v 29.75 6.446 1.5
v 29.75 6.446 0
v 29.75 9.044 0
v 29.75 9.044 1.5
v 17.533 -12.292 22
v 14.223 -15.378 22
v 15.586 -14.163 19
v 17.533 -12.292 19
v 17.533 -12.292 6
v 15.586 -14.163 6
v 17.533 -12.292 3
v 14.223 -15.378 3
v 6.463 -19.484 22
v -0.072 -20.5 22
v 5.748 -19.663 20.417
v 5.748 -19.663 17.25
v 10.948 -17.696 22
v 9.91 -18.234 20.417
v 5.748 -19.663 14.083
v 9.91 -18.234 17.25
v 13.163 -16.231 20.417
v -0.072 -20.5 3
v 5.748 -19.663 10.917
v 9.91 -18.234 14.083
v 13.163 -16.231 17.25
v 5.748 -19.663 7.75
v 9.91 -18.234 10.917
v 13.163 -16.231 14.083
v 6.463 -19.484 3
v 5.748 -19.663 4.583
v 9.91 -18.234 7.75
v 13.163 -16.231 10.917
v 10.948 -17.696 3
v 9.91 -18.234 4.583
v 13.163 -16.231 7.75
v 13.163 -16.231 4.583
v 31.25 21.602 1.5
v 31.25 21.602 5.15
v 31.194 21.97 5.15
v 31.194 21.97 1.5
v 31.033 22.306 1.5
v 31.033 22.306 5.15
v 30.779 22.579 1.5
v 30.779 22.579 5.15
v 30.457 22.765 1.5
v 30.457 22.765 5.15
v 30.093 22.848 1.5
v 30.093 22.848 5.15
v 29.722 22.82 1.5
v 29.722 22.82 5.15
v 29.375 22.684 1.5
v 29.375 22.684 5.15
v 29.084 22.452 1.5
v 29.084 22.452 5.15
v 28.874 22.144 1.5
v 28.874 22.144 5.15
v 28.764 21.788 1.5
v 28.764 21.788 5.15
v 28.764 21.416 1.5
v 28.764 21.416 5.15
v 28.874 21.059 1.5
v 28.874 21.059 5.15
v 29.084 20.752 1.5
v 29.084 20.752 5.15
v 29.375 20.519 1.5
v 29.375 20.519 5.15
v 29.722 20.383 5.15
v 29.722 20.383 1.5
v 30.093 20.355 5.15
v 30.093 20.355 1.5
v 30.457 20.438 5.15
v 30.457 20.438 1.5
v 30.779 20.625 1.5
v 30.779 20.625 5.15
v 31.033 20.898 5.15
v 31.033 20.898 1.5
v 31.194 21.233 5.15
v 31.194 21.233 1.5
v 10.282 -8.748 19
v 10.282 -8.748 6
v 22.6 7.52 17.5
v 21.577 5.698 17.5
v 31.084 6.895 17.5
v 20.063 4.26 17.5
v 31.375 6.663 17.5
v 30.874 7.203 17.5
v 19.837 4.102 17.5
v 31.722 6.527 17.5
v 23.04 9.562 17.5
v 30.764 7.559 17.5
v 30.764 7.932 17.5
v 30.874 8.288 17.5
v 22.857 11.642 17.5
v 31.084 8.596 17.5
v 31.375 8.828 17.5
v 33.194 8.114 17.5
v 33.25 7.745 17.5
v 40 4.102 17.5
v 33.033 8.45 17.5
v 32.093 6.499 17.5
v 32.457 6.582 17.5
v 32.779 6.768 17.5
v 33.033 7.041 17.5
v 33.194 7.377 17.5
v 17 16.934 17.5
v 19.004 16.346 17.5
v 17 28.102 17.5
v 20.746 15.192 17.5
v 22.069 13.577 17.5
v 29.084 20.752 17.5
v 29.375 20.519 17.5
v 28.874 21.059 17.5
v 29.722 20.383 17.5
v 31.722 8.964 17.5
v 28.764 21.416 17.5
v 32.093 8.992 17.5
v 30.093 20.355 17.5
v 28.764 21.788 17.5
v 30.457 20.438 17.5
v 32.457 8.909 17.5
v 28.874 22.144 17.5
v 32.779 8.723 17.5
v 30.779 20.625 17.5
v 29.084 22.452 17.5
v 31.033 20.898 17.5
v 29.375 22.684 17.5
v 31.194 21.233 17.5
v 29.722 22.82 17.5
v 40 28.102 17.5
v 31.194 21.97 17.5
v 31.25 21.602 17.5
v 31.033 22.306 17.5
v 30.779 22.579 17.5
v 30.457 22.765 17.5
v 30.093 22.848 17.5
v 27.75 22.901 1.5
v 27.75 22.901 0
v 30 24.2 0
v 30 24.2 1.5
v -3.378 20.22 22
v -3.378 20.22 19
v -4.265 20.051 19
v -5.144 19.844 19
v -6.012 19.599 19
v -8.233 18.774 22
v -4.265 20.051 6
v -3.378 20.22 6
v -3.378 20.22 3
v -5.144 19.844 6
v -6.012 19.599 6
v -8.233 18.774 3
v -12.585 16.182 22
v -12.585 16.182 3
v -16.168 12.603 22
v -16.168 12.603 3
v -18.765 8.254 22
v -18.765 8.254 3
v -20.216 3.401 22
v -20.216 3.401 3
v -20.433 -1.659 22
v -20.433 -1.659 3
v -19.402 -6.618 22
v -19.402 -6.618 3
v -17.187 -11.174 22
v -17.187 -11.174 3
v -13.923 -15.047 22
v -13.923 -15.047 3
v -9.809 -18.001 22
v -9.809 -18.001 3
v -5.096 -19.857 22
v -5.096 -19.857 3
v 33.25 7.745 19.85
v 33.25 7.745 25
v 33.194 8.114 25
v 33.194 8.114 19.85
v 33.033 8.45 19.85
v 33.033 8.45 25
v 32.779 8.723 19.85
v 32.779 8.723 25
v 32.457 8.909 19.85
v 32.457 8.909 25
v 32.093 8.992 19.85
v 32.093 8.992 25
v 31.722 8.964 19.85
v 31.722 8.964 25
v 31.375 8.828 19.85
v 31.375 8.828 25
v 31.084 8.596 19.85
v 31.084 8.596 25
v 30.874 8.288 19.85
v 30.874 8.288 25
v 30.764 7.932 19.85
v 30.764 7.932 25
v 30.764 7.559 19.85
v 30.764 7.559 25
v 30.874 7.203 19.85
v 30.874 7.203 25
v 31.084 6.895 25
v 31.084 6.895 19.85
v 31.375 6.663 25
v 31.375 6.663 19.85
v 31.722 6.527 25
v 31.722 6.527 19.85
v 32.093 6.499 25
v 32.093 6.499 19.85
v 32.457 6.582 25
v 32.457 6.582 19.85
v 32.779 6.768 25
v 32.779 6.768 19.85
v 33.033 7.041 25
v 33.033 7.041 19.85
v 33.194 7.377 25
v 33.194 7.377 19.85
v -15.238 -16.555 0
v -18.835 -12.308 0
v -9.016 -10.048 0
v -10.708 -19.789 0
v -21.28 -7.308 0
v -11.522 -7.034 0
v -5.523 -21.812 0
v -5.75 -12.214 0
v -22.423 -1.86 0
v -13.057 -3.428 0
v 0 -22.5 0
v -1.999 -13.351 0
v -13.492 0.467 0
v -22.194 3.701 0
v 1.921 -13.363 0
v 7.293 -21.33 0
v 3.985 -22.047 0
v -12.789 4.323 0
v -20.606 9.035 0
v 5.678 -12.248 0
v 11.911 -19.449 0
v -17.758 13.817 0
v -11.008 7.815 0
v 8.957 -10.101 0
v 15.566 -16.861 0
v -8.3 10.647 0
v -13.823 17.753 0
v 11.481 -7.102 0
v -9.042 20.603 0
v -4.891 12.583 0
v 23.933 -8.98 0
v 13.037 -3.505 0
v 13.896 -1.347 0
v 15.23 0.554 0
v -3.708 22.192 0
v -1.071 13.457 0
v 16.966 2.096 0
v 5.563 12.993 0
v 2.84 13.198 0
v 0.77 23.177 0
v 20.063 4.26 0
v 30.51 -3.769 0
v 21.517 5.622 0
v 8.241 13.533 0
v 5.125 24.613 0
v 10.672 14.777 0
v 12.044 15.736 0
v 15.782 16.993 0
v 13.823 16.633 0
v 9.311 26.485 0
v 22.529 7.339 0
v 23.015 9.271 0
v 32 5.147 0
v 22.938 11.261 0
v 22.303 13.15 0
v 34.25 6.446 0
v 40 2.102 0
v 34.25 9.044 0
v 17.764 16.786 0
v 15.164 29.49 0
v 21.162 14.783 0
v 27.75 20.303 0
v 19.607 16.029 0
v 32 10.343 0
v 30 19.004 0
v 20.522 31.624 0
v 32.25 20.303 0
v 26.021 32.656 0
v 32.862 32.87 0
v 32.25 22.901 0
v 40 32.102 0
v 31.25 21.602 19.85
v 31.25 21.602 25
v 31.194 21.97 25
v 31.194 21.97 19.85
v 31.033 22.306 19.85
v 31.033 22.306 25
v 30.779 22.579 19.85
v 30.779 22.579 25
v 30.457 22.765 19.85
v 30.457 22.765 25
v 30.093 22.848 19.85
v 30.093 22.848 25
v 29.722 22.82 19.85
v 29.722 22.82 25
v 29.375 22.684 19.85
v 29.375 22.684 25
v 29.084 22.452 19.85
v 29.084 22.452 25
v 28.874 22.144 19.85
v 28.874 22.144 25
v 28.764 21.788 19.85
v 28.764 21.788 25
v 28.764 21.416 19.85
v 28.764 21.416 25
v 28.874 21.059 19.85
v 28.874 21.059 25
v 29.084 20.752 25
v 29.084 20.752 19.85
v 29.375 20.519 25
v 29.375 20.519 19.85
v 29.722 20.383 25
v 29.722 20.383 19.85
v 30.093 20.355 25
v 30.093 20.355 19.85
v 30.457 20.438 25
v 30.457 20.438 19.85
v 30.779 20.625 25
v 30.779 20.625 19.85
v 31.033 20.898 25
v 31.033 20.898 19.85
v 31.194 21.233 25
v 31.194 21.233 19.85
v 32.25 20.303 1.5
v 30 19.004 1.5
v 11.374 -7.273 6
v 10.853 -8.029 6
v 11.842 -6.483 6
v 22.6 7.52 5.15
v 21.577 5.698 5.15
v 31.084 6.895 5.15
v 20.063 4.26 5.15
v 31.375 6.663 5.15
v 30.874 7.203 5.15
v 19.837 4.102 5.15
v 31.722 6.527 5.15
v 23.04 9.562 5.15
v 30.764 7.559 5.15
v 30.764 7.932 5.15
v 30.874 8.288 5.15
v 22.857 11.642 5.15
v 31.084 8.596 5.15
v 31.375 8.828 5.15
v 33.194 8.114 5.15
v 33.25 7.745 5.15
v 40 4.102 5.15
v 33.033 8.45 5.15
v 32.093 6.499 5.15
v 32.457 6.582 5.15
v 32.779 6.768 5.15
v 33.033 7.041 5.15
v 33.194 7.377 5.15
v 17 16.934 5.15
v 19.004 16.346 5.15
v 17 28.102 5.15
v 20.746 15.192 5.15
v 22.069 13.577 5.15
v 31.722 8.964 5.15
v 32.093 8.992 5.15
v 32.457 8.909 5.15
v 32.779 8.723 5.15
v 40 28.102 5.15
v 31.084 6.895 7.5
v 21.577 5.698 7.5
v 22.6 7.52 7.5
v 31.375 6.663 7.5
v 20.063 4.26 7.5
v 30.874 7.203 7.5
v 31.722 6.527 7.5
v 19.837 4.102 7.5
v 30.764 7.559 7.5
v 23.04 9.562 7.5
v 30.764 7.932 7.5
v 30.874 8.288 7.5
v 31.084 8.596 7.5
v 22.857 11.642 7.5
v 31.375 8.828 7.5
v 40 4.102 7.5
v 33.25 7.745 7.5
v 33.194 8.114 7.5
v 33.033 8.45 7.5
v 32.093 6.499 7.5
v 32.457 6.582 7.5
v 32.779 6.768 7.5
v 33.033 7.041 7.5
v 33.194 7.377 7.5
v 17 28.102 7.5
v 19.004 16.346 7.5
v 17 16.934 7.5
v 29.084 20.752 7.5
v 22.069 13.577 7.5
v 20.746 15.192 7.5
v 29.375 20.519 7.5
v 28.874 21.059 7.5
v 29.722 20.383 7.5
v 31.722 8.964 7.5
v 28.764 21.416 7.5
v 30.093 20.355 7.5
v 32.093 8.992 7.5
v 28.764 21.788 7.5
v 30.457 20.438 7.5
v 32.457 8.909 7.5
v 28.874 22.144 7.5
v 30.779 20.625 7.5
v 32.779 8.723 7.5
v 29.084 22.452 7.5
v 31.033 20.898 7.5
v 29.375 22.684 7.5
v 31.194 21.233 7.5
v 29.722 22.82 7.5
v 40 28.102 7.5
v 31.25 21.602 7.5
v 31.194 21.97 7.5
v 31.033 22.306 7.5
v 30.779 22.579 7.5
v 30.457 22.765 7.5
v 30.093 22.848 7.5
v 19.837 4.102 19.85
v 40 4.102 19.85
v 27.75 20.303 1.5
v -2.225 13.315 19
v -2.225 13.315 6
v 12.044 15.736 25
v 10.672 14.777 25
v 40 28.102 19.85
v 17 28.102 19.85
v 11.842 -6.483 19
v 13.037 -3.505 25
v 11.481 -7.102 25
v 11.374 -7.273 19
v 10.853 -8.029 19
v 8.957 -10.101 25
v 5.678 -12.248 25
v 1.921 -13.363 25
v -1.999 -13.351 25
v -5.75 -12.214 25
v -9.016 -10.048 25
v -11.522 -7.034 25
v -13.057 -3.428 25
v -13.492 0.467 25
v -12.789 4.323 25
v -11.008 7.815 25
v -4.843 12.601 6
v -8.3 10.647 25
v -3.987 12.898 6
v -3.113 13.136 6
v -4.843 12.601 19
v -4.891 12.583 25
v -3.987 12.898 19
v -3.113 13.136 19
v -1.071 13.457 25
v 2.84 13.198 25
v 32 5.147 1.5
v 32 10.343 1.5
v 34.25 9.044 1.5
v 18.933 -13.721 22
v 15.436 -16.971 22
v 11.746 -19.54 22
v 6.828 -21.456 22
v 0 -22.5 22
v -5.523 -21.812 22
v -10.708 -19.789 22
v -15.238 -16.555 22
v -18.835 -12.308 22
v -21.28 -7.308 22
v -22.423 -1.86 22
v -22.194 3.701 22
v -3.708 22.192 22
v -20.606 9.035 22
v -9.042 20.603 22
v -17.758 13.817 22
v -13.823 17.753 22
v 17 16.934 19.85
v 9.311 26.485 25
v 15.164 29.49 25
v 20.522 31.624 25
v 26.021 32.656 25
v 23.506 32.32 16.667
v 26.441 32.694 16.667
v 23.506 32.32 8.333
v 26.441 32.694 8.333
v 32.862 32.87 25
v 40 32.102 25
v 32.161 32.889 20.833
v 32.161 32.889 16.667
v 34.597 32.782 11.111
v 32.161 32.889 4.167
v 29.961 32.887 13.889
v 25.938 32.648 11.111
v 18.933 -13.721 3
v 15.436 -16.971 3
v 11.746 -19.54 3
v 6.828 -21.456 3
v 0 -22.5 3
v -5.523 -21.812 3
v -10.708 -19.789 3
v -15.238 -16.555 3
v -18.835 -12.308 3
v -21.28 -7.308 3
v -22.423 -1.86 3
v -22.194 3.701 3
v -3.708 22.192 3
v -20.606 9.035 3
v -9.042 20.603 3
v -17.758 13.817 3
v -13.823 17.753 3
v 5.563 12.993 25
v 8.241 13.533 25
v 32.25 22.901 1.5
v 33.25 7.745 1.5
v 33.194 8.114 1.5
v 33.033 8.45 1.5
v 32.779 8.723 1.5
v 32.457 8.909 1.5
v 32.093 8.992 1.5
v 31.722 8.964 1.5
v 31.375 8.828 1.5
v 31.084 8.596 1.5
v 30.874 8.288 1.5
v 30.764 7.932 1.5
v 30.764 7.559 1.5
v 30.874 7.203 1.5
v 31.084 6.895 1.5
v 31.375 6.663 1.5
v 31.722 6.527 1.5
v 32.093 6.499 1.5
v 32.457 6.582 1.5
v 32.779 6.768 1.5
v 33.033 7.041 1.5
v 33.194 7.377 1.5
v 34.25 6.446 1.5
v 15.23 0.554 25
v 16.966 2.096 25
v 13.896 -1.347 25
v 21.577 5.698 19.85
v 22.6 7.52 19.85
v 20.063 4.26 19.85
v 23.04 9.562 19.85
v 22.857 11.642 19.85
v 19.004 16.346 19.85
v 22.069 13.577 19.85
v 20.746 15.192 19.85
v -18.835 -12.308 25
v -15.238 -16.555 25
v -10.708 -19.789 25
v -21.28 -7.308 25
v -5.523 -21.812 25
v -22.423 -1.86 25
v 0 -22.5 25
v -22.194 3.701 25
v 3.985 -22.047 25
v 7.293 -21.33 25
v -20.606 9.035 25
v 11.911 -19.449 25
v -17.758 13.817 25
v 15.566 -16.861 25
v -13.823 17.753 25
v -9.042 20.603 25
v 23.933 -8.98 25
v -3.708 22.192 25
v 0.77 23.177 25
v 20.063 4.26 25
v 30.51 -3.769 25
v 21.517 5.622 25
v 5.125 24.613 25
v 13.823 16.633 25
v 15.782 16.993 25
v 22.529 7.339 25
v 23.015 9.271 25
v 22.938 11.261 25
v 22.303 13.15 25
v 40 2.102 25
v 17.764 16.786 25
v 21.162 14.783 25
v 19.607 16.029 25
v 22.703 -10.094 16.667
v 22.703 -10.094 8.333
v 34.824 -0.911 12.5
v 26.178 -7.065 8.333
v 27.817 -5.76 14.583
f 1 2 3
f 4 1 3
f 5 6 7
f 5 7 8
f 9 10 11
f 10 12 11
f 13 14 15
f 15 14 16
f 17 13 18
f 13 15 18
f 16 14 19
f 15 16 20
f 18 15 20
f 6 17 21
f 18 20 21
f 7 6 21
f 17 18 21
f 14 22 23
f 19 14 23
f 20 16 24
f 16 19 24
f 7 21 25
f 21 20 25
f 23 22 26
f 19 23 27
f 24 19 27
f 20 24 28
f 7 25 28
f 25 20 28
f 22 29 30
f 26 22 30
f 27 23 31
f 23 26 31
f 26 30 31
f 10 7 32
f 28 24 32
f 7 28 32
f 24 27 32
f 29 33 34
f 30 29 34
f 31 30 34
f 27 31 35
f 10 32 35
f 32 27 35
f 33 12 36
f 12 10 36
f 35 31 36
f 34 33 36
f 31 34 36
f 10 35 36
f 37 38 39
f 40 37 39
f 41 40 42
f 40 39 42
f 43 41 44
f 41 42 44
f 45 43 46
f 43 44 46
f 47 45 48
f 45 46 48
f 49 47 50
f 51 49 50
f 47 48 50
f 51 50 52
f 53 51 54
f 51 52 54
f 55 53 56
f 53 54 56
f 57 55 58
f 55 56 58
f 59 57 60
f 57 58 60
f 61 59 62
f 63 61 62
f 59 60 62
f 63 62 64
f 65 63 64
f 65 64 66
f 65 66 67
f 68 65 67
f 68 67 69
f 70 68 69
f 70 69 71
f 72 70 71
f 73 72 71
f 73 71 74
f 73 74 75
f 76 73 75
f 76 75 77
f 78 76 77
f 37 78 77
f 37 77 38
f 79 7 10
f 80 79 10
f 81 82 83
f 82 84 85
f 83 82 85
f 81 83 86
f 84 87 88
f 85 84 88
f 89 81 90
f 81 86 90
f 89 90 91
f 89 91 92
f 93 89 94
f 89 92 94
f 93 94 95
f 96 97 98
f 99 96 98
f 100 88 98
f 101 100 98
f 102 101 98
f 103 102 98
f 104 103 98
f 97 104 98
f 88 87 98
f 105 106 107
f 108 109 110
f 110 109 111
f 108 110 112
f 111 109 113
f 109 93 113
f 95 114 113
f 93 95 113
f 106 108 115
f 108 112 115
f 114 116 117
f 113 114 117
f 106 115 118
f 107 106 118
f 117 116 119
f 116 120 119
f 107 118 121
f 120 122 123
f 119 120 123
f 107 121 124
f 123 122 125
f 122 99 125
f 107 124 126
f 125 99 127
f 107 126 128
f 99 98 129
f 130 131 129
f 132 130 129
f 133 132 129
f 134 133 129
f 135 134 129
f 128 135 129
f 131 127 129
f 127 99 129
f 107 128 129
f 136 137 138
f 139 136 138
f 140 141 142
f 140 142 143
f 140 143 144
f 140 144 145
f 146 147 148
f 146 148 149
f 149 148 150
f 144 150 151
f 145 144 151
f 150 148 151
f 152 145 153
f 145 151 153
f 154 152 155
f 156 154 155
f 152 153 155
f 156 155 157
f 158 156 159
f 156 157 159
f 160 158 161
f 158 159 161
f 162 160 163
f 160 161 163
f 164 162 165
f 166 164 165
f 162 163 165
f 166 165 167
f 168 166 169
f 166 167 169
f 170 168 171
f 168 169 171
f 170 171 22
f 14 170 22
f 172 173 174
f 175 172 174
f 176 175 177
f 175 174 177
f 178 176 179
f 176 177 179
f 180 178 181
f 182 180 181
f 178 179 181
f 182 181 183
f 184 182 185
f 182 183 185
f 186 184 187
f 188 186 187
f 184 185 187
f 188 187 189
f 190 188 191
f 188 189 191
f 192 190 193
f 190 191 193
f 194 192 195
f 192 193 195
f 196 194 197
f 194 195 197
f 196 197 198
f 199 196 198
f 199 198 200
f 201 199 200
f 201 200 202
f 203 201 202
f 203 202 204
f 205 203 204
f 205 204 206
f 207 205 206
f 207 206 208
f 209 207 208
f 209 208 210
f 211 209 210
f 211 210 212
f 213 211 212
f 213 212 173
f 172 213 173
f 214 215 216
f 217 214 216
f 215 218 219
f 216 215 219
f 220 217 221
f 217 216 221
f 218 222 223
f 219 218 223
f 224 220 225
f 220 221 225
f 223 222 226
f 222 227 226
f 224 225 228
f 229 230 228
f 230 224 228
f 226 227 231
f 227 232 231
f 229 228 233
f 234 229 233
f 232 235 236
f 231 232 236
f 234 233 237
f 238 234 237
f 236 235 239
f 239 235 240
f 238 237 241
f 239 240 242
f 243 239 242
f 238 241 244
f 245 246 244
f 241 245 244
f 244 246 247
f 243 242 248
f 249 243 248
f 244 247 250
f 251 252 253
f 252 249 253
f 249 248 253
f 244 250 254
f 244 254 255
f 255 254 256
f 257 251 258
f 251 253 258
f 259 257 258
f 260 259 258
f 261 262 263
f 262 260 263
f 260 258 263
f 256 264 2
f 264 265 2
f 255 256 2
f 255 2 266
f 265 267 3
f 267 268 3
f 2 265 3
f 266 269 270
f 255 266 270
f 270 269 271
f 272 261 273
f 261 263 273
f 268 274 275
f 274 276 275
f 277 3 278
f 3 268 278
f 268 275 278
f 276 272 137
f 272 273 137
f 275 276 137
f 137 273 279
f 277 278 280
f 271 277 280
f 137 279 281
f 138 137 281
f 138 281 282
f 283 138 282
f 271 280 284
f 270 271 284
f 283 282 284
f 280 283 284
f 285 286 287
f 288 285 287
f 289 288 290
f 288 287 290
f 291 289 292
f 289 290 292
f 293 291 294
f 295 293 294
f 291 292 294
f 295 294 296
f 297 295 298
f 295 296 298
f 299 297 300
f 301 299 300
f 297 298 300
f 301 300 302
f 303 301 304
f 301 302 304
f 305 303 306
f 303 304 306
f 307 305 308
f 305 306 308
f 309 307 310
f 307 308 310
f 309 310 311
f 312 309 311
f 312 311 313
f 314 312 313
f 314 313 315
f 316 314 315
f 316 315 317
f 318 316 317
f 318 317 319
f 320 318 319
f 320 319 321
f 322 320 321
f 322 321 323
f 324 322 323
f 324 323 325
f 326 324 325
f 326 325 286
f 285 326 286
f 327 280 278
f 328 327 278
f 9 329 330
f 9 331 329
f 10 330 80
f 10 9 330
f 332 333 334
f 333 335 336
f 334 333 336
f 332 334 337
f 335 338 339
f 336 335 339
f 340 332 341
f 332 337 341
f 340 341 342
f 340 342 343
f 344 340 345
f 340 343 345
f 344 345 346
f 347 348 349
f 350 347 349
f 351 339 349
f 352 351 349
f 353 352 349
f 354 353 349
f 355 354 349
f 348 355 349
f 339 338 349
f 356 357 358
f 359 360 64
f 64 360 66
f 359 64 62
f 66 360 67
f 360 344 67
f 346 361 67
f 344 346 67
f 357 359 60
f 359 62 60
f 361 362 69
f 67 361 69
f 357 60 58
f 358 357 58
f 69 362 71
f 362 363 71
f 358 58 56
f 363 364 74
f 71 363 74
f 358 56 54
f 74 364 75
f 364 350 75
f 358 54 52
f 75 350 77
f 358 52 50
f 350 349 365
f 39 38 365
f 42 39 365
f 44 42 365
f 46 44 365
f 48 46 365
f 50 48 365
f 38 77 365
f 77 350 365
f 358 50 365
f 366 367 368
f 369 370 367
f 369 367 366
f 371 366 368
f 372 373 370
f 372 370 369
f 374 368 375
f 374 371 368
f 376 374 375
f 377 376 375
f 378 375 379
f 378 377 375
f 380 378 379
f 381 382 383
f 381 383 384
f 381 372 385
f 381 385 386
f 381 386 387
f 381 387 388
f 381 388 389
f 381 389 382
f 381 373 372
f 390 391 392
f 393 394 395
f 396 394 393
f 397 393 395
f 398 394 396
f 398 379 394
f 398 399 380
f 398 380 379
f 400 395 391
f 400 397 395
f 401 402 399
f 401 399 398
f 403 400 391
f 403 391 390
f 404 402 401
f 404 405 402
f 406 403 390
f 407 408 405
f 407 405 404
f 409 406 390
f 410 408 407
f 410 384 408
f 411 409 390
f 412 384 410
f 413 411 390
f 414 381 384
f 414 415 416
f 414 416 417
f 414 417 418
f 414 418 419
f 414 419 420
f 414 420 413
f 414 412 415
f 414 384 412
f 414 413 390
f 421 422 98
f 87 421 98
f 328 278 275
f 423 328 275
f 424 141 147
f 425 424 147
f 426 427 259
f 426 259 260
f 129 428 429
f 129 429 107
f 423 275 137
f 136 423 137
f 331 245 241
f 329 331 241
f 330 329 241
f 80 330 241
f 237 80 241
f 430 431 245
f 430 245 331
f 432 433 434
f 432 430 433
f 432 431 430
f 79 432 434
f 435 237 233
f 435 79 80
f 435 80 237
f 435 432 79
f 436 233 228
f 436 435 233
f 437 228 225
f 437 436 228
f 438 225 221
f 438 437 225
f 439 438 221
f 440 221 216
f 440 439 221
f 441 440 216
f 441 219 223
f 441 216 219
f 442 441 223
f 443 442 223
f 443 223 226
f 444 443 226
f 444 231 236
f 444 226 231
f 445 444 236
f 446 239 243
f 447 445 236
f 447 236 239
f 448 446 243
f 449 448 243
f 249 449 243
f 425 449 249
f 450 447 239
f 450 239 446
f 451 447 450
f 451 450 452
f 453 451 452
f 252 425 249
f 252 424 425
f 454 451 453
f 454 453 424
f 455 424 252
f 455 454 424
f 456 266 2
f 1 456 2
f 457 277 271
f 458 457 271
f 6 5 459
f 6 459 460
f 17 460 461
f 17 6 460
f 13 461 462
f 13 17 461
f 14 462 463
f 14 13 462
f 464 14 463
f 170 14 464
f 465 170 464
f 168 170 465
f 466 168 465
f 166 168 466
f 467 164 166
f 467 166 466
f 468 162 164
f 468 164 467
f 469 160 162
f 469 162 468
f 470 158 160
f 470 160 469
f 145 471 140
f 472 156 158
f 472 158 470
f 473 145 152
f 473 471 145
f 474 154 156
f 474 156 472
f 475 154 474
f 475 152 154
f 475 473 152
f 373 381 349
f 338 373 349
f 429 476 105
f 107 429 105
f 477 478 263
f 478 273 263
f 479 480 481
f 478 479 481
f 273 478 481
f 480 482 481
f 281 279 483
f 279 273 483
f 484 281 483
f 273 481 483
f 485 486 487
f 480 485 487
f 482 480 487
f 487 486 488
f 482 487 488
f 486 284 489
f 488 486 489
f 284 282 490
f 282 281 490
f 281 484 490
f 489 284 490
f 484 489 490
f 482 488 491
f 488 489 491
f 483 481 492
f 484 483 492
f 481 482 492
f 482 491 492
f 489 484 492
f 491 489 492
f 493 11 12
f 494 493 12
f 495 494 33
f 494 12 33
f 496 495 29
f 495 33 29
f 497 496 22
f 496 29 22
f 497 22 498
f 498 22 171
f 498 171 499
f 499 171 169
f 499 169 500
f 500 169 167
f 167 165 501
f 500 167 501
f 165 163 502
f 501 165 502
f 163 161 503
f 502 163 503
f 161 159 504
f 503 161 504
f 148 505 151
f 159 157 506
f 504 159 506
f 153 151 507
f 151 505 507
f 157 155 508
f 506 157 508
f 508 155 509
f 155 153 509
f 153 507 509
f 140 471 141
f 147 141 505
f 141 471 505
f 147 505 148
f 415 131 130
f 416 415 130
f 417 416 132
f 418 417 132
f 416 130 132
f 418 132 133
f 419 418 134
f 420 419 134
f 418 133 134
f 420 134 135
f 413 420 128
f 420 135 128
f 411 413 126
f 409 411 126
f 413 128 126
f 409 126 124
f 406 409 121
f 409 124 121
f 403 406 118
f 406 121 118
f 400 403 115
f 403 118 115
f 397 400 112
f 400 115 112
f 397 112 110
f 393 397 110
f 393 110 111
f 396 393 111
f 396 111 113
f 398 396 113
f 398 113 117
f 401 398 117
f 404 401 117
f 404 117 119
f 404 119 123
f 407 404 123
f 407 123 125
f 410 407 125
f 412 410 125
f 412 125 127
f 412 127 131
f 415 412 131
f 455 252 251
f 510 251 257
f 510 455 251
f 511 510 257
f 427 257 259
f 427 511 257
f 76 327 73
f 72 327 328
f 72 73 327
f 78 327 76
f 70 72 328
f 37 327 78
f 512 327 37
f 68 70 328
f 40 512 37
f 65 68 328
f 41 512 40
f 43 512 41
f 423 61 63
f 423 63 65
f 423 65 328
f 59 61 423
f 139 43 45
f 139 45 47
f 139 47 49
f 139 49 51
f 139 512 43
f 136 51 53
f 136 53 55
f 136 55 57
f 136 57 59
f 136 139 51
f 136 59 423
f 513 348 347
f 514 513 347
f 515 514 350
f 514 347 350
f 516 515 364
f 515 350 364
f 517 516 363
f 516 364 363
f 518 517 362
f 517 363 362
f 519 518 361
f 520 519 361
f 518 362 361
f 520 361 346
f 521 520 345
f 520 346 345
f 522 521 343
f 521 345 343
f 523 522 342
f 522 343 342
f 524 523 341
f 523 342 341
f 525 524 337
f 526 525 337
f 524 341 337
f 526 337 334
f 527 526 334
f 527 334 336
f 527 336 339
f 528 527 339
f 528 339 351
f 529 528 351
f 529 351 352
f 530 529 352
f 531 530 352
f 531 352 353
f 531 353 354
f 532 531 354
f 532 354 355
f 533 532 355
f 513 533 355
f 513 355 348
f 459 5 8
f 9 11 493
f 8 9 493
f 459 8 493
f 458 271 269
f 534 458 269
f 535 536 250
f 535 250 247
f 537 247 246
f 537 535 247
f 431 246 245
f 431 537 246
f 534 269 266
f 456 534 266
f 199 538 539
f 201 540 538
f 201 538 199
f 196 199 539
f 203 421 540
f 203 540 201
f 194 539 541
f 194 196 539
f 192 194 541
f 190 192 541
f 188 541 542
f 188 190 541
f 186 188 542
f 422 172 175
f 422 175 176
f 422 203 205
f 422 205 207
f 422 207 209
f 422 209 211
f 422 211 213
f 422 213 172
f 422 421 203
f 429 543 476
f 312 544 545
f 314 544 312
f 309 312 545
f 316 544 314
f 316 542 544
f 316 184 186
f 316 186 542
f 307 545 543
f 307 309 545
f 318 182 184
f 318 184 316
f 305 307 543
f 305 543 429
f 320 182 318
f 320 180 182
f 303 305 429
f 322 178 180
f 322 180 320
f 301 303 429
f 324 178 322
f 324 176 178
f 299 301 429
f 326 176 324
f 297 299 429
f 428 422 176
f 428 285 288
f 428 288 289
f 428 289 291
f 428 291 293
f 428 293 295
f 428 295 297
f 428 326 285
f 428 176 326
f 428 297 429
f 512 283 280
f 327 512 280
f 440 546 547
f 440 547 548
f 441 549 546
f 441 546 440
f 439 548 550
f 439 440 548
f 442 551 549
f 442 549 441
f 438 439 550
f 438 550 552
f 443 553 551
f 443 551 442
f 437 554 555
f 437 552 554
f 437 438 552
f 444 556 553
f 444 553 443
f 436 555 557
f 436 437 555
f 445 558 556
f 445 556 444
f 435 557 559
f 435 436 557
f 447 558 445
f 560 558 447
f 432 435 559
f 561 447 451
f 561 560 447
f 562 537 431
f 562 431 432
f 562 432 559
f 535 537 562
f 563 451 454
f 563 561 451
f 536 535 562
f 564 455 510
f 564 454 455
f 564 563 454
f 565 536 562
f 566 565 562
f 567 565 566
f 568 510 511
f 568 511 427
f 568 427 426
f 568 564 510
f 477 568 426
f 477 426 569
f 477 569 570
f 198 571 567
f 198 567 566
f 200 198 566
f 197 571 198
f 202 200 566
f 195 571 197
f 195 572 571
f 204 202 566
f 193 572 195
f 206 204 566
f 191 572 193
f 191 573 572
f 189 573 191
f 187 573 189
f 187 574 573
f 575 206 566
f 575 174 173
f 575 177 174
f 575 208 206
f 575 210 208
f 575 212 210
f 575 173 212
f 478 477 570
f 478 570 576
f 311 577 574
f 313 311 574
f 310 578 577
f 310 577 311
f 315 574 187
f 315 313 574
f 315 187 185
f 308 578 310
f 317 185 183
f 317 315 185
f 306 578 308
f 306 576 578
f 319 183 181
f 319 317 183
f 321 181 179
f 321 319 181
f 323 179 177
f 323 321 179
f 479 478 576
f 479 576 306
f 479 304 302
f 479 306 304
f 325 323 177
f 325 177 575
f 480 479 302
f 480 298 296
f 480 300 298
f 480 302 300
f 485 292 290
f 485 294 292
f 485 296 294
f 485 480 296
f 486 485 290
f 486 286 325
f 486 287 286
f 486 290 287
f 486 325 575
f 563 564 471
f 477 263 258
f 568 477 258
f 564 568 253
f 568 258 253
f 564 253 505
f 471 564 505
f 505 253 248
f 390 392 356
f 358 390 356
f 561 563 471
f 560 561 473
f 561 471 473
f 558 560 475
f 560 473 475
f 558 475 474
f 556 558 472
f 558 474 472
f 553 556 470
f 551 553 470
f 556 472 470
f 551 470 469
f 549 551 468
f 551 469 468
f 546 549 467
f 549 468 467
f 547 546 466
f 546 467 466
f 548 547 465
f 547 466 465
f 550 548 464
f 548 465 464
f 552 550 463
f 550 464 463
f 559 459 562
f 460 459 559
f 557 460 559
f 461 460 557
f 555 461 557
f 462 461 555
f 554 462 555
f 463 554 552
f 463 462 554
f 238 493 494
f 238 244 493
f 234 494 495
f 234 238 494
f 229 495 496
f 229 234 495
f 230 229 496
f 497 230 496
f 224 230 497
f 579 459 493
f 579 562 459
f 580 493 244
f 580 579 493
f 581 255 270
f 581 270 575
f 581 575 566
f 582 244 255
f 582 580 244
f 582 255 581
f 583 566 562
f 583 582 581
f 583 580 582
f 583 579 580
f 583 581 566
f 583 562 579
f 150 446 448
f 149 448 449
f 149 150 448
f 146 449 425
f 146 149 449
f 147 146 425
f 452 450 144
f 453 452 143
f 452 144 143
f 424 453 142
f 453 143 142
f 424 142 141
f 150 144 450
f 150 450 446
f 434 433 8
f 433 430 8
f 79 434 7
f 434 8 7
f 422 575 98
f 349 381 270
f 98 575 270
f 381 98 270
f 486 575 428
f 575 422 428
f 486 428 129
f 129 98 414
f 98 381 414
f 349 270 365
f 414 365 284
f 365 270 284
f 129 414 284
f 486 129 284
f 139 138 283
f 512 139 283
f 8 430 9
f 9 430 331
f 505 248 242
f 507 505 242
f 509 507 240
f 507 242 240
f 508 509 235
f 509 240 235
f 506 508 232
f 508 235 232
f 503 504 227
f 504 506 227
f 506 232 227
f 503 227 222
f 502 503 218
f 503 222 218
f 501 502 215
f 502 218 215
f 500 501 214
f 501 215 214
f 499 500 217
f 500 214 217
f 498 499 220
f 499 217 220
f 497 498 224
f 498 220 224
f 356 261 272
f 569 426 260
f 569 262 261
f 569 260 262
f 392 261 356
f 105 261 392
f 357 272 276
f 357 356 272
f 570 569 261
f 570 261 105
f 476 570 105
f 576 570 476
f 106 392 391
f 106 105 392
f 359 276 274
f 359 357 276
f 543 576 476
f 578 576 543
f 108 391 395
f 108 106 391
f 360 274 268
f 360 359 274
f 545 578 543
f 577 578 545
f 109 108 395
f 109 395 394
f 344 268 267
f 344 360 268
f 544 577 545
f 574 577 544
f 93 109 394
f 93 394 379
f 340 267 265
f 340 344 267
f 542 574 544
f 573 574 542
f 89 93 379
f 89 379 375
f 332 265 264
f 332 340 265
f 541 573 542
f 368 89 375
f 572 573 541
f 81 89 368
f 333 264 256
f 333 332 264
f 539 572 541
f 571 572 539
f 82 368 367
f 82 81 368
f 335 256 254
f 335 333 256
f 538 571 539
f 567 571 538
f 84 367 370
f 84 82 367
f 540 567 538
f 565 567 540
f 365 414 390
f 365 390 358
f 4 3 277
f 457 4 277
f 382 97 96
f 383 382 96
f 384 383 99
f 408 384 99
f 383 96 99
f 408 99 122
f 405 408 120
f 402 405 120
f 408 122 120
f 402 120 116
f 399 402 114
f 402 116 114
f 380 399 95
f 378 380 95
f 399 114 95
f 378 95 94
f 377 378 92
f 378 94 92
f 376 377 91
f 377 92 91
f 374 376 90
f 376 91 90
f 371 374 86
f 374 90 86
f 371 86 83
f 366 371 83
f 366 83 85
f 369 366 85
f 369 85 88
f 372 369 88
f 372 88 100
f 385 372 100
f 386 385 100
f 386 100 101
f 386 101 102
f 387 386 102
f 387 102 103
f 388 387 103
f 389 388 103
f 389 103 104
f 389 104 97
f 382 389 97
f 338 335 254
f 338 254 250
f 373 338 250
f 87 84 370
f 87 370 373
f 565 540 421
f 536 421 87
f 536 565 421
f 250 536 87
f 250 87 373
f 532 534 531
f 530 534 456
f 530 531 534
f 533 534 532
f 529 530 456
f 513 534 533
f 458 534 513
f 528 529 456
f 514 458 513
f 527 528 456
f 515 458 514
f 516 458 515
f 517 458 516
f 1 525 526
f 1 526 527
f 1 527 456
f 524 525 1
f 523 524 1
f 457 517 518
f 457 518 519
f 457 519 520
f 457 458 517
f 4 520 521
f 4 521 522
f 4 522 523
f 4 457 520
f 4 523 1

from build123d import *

# Parameters (mm, degrees)
BOSS_EXTRUDE1_DEPTH            = 25
SKETCH2_W                      = 2.35
SKETCH2_H                      = 24
CUT_EXTRUDE1_DEPTH             = 23
SKETCH3_R                      = 1.25
CUT_EXTRUDE2_DEPTH             = 58.509648628
CUT_EXTRUDE3_DEPTH             = 58.509648628
CUT_EXTRUDE5_START             = -22
CUT_EXTRUDE5_DEPTH             = 19
CUT_EXTRUDE6_REACH             = 67.815
CUT_EXTRUDE6_END_RADIUS        = 13.5
SKETCH9_W                      = 2.7
SKETCH9_H                      = 13
CUT_EXTRUDE7_REACH             = 67.138
SKETCH10_W                     = 2.7
SKETCH10_H                     = 13
CUT_EXTRUDE7_DIRECTION_2_REACH = 67.138
CUT_EXTRUDE8_DEPTH             = 1.5


with BuildPart() as part:
    # Sketch1 → Boss-Extrude1 (new body)
    with BuildSketch(Plane.XY):
        with BuildLine():
            Line((40, 2.101809534), (40, 32.101809534))
            add(Edge.make_bspline(
                [(40, 32.101809534), (34.329847466, 33.163229144), (26.982496241, 32.840779877), (18.572888448, 31.653354862), (14.859267804, 29.312585721), (9.310772029, 26.484528724)],
                knots=[0, 0, 0, 0, 0.184099436, 0.268179873, 0.840804373, 0.840804373, 0.840804373, 0.840804373], degree=3))
            ThreePointArc((9.310772029, 26.484528724), (2.965735487, 23.839790418), (-3.708097079, 22.192341383))
            ThreePointArc((-3.708097079, 22.192341383), (-22.422953431, -1.860419158), (0, -22.5))
            add(Edge.make_bspline(
                [(40, 2.101809534), (14.753998058, -11.692085759), (19.320151725, -21.091052748), (0, -22.5)],
                knots=[0, 0, 0, 0, 1, 1, 1, 1], degree=3))
        make_face()
    extrude(amount=BOSS_EXTRUDE1_DEPTH)

    # Sketch2 → Cut-Extrude1 (cut)
    with BuildSketch(Plane(origin=(40, 0, 0), x_dir=(0, 0, -1), z_dir=(1, 0, 0))):
        with Locations((-18.675, 16.101809534)):
            Rectangle(SKETCH2_W, SKETCH2_H)
        with Locations((-6.325, 16.101809534)):
            Rectangle(SKETCH2_W, SKETCH2_H)
    extrude(amount=-CUT_EXTRUDE1_DEPTH, mode=Mode.SUBTRACT)

    # Sketch3 → Cut-Extrude2 (cut, through all)
    with BuildSketch(Plane.XY.offset(25)):
        with Locations((30, 21.601809534)):
            Circle(SKETCH3_R)
        with Locations((32, 7.745403073)):
            Circle(SKETCH3_R)
    extrude(amount=-CUT_EXTRUDE2_DEPTH, mode=Mode.SUBTRACT)

    # Sketch4 → Cut-Extrude3 (cut, through all)
    with BuildSketch(Plane.XY.offset(25)):
        with BuildLine():
            Line((10.671834965, 14.77707476), (12.04378968, 15.735776262))
            ThreePointArc((12.04378968, 15.735776262), (21.791242729, 14.007436293), (20.062902761, 4.259983244))
            Line((20.062902761, 4.259983244), (16.966325256, 2.096141048))
            ThreePointArc((16.966325256, 2.096141048), (14.507836146, -0.357822313), (13.037129907, -3.504745895))
            ThreePointArc((13.037129907, -3.504745895), (-11.522414618, -7.034483732), (2.840111071, 13.19786987))
            ThreePointArc((2.840111071, 13.19786987), (6.920533419, 13.171370724), (10.671834965, 14.77707476))
        make_face()
    extrude(amount=-CUT_EXTRUDE3_DEPTH, mode=Mode.SUBTRACT)

    # Sketch6 → Cut-Extrude5 (cut)
    with BuildSketch(Plane.XY.offset(25).offset(CUT_EXTRUDE5_START)):
        with BuildLine():
            Line((-3.708097079, 22.192341383), (-3.378488449, 20.219688816))
            ThreePointArc((-3.378488449, 20.219688816), (-20.432738232, -1.659279471), (-0.071778676, -20.499874337))
            add(Edge.make_bspline(
                [(-0.071778676, -20.499874337), (0.208558967, -20.479056775), (0.777070886, -20.432379755), (1.847267067, -20.326496662), (3.108426982, -20.167703365), (4.494156168, -19.937504643), (6.189724602, -19.579509646), (8.047092499, -19.040626432), (9.948281947, -18.257182138), (11.622649285, -17.334955593), (13.684671017, -15.901647803), (15.442310851, -14.323635678), (16.949424963, -12.863739279), (17.392469361, -12.430339701), (17.53347875, -12.292192277)],
                knots=[0.001319104, 0.001319104, 0.001319104, 0.001319104, 0.016708897, 0.03209869, 0.062878276, 0.093657862, 0.124437448, 0.185996621, 0.247555793, 0.309114965, 0.370674138, 0.493792482, 0.527315904, 0.542705697, 0.542705697, 0.542705697, 0.542705697], degree=3))
            Line((17.53347875, -12.292192277), (18.933119987, -13.720829532))
            add(Edge.make_bspline(
                [(0, -22.5), (10.485156415, -21.735356299), (13.935091868, -18.617416288), (18.933119987, -13.720829532)],
                knots=[0, 0, 0, 0, 0.542705697, 0.542705697, 0.542705697, 0.542705697], degree=3))
            ThreePointArc((0, -22.5), (-22.422953431, -1.860419158), (-3.708097079, 22.192341383))
        make_face()
    extrude(amount=CUT_EXTRUDE5_DEPTH, mode=Mode.SUBTRACT)

    # Cut-Extrude6: up to this cylinder (the profile starts outside it)
    cut_extrude6_end = Plane(origin=(0, 0, 12.5), z_dir=(0, 0, 1)) * Cylinder(CUT_EXTRUDE6_END_RADIUS, 163.63, mode=Mode.PRIVATE)
    # Sketch9 → Cut-Extrude6 (cut, up to the surface)
    with BuildSketch(Plane(origin=(-3.378488449, 20.219688816, 0), x_dir=(0.9863262836854494, 0.16480431460144024, 0), z_dir=(-0.16480431460144024, 0.9863262836854494, 0)), mode=Mode.PRIVATE) as cut_extrude6_sk1:
        with Locations((-1.35, -12.5)):
            Rectangle(SKETCH9_W, SKETCH9_H)
    cut_extrude6_tool1 = extrude(cut_extrude6_sk1.sketch, amount=-CUT_EXTRUDE6_REACH, mode=Mode.PRIVATE) - cut_extrude6_end
    add(cut_extrude6_tool1.solids().sort_by_distance((-4.710029, 19.997203, 12.5))[0], mode=Mode.SUBTRACT)

    # Sketch10 → Cut-Extrude7 (cut, up to next)
    with BuildSketch(Plane(origin=(14.346322684, -14.643531864, 0), x_dir=(-0.7143186274909935, -0.6998206187441061, 0), z_dir=(0.6998206187441061, -0.7143186274909935, 0)), mode=Mode.PRIVATE) as cut_extrude7_sk1:
        with Locations((-2.57216087, -12.5)):
            Rectangle(SKETCH10_W, SKETCH10_H)
    cut_extrude7_tool1 = extrude(cut_extrude7_sk1.sketch, amount=-CUT_EXTRUDE7_REACH, mode=Mode.PRIVATE) & part.part
    add(cut_extrude7_tool1.solids().sort_by_distance((16.183665, -12.843481, 12.5))[0], mode=Mode.SUBTRACT)

    # Sketch10 → Cut-Extrude7 direction 2 (cut, up to next)
    with BuildSketch(Plane(origin=(14.346322684, -14.643531864, 0), x_dir=(-0.7143186274909935, -0.6998206187441061, 0), z_dir=(0.6998206187441061, -0.7143186274909935, 0)), mode=Mode.PRIVATE) as cut_extrude7_direction_2_sk1:
        with Locations((-2.57216087, -12.5)):
            Rectangle(SKETCH10_W, SKETCH10_H)
    cut_extrude7_direction_2_tool1 = extrude(cut_extrude7_direction_2_sk1.sketch, amount=CUT_EXTRUDE7_DIRECTION_2_REACH, mode=Mode.PRIVATE) & part.part
    add(cut_extrude7_direction_2_tool1.solids().sort_by_distance((16.183665, -12.843481, 12.5))[0], mode=Mode.SUBTRACT)

    # Sketch13 → Cut-Extrude8 (cut)
    with BuildSketch(Plane(origin=(0, 0, 0), x_dir=(-1, 0, 0), z_dir=(0, 0, -1))):
        Polygon((-27.75, 20.302771428), (-27.75, 22.900847639), (-30, 24.199885745), (-32.25, 22.900847639), (-32.25, 20.302771428), (-30, 19.003733322), align=None)
        Polygon((-29.75, 9.044441179), (-32, 10.343479284), (-34.25, 9.044441179), (-34.25, 6.446364967), (-32, 5.147326862), (-29.75, 6.446364967), align=None)
    extrude(amount=-CUT_EXTRUDE8_DEPTH, mode=Mode.SUBTRACT)


solid = part.part
